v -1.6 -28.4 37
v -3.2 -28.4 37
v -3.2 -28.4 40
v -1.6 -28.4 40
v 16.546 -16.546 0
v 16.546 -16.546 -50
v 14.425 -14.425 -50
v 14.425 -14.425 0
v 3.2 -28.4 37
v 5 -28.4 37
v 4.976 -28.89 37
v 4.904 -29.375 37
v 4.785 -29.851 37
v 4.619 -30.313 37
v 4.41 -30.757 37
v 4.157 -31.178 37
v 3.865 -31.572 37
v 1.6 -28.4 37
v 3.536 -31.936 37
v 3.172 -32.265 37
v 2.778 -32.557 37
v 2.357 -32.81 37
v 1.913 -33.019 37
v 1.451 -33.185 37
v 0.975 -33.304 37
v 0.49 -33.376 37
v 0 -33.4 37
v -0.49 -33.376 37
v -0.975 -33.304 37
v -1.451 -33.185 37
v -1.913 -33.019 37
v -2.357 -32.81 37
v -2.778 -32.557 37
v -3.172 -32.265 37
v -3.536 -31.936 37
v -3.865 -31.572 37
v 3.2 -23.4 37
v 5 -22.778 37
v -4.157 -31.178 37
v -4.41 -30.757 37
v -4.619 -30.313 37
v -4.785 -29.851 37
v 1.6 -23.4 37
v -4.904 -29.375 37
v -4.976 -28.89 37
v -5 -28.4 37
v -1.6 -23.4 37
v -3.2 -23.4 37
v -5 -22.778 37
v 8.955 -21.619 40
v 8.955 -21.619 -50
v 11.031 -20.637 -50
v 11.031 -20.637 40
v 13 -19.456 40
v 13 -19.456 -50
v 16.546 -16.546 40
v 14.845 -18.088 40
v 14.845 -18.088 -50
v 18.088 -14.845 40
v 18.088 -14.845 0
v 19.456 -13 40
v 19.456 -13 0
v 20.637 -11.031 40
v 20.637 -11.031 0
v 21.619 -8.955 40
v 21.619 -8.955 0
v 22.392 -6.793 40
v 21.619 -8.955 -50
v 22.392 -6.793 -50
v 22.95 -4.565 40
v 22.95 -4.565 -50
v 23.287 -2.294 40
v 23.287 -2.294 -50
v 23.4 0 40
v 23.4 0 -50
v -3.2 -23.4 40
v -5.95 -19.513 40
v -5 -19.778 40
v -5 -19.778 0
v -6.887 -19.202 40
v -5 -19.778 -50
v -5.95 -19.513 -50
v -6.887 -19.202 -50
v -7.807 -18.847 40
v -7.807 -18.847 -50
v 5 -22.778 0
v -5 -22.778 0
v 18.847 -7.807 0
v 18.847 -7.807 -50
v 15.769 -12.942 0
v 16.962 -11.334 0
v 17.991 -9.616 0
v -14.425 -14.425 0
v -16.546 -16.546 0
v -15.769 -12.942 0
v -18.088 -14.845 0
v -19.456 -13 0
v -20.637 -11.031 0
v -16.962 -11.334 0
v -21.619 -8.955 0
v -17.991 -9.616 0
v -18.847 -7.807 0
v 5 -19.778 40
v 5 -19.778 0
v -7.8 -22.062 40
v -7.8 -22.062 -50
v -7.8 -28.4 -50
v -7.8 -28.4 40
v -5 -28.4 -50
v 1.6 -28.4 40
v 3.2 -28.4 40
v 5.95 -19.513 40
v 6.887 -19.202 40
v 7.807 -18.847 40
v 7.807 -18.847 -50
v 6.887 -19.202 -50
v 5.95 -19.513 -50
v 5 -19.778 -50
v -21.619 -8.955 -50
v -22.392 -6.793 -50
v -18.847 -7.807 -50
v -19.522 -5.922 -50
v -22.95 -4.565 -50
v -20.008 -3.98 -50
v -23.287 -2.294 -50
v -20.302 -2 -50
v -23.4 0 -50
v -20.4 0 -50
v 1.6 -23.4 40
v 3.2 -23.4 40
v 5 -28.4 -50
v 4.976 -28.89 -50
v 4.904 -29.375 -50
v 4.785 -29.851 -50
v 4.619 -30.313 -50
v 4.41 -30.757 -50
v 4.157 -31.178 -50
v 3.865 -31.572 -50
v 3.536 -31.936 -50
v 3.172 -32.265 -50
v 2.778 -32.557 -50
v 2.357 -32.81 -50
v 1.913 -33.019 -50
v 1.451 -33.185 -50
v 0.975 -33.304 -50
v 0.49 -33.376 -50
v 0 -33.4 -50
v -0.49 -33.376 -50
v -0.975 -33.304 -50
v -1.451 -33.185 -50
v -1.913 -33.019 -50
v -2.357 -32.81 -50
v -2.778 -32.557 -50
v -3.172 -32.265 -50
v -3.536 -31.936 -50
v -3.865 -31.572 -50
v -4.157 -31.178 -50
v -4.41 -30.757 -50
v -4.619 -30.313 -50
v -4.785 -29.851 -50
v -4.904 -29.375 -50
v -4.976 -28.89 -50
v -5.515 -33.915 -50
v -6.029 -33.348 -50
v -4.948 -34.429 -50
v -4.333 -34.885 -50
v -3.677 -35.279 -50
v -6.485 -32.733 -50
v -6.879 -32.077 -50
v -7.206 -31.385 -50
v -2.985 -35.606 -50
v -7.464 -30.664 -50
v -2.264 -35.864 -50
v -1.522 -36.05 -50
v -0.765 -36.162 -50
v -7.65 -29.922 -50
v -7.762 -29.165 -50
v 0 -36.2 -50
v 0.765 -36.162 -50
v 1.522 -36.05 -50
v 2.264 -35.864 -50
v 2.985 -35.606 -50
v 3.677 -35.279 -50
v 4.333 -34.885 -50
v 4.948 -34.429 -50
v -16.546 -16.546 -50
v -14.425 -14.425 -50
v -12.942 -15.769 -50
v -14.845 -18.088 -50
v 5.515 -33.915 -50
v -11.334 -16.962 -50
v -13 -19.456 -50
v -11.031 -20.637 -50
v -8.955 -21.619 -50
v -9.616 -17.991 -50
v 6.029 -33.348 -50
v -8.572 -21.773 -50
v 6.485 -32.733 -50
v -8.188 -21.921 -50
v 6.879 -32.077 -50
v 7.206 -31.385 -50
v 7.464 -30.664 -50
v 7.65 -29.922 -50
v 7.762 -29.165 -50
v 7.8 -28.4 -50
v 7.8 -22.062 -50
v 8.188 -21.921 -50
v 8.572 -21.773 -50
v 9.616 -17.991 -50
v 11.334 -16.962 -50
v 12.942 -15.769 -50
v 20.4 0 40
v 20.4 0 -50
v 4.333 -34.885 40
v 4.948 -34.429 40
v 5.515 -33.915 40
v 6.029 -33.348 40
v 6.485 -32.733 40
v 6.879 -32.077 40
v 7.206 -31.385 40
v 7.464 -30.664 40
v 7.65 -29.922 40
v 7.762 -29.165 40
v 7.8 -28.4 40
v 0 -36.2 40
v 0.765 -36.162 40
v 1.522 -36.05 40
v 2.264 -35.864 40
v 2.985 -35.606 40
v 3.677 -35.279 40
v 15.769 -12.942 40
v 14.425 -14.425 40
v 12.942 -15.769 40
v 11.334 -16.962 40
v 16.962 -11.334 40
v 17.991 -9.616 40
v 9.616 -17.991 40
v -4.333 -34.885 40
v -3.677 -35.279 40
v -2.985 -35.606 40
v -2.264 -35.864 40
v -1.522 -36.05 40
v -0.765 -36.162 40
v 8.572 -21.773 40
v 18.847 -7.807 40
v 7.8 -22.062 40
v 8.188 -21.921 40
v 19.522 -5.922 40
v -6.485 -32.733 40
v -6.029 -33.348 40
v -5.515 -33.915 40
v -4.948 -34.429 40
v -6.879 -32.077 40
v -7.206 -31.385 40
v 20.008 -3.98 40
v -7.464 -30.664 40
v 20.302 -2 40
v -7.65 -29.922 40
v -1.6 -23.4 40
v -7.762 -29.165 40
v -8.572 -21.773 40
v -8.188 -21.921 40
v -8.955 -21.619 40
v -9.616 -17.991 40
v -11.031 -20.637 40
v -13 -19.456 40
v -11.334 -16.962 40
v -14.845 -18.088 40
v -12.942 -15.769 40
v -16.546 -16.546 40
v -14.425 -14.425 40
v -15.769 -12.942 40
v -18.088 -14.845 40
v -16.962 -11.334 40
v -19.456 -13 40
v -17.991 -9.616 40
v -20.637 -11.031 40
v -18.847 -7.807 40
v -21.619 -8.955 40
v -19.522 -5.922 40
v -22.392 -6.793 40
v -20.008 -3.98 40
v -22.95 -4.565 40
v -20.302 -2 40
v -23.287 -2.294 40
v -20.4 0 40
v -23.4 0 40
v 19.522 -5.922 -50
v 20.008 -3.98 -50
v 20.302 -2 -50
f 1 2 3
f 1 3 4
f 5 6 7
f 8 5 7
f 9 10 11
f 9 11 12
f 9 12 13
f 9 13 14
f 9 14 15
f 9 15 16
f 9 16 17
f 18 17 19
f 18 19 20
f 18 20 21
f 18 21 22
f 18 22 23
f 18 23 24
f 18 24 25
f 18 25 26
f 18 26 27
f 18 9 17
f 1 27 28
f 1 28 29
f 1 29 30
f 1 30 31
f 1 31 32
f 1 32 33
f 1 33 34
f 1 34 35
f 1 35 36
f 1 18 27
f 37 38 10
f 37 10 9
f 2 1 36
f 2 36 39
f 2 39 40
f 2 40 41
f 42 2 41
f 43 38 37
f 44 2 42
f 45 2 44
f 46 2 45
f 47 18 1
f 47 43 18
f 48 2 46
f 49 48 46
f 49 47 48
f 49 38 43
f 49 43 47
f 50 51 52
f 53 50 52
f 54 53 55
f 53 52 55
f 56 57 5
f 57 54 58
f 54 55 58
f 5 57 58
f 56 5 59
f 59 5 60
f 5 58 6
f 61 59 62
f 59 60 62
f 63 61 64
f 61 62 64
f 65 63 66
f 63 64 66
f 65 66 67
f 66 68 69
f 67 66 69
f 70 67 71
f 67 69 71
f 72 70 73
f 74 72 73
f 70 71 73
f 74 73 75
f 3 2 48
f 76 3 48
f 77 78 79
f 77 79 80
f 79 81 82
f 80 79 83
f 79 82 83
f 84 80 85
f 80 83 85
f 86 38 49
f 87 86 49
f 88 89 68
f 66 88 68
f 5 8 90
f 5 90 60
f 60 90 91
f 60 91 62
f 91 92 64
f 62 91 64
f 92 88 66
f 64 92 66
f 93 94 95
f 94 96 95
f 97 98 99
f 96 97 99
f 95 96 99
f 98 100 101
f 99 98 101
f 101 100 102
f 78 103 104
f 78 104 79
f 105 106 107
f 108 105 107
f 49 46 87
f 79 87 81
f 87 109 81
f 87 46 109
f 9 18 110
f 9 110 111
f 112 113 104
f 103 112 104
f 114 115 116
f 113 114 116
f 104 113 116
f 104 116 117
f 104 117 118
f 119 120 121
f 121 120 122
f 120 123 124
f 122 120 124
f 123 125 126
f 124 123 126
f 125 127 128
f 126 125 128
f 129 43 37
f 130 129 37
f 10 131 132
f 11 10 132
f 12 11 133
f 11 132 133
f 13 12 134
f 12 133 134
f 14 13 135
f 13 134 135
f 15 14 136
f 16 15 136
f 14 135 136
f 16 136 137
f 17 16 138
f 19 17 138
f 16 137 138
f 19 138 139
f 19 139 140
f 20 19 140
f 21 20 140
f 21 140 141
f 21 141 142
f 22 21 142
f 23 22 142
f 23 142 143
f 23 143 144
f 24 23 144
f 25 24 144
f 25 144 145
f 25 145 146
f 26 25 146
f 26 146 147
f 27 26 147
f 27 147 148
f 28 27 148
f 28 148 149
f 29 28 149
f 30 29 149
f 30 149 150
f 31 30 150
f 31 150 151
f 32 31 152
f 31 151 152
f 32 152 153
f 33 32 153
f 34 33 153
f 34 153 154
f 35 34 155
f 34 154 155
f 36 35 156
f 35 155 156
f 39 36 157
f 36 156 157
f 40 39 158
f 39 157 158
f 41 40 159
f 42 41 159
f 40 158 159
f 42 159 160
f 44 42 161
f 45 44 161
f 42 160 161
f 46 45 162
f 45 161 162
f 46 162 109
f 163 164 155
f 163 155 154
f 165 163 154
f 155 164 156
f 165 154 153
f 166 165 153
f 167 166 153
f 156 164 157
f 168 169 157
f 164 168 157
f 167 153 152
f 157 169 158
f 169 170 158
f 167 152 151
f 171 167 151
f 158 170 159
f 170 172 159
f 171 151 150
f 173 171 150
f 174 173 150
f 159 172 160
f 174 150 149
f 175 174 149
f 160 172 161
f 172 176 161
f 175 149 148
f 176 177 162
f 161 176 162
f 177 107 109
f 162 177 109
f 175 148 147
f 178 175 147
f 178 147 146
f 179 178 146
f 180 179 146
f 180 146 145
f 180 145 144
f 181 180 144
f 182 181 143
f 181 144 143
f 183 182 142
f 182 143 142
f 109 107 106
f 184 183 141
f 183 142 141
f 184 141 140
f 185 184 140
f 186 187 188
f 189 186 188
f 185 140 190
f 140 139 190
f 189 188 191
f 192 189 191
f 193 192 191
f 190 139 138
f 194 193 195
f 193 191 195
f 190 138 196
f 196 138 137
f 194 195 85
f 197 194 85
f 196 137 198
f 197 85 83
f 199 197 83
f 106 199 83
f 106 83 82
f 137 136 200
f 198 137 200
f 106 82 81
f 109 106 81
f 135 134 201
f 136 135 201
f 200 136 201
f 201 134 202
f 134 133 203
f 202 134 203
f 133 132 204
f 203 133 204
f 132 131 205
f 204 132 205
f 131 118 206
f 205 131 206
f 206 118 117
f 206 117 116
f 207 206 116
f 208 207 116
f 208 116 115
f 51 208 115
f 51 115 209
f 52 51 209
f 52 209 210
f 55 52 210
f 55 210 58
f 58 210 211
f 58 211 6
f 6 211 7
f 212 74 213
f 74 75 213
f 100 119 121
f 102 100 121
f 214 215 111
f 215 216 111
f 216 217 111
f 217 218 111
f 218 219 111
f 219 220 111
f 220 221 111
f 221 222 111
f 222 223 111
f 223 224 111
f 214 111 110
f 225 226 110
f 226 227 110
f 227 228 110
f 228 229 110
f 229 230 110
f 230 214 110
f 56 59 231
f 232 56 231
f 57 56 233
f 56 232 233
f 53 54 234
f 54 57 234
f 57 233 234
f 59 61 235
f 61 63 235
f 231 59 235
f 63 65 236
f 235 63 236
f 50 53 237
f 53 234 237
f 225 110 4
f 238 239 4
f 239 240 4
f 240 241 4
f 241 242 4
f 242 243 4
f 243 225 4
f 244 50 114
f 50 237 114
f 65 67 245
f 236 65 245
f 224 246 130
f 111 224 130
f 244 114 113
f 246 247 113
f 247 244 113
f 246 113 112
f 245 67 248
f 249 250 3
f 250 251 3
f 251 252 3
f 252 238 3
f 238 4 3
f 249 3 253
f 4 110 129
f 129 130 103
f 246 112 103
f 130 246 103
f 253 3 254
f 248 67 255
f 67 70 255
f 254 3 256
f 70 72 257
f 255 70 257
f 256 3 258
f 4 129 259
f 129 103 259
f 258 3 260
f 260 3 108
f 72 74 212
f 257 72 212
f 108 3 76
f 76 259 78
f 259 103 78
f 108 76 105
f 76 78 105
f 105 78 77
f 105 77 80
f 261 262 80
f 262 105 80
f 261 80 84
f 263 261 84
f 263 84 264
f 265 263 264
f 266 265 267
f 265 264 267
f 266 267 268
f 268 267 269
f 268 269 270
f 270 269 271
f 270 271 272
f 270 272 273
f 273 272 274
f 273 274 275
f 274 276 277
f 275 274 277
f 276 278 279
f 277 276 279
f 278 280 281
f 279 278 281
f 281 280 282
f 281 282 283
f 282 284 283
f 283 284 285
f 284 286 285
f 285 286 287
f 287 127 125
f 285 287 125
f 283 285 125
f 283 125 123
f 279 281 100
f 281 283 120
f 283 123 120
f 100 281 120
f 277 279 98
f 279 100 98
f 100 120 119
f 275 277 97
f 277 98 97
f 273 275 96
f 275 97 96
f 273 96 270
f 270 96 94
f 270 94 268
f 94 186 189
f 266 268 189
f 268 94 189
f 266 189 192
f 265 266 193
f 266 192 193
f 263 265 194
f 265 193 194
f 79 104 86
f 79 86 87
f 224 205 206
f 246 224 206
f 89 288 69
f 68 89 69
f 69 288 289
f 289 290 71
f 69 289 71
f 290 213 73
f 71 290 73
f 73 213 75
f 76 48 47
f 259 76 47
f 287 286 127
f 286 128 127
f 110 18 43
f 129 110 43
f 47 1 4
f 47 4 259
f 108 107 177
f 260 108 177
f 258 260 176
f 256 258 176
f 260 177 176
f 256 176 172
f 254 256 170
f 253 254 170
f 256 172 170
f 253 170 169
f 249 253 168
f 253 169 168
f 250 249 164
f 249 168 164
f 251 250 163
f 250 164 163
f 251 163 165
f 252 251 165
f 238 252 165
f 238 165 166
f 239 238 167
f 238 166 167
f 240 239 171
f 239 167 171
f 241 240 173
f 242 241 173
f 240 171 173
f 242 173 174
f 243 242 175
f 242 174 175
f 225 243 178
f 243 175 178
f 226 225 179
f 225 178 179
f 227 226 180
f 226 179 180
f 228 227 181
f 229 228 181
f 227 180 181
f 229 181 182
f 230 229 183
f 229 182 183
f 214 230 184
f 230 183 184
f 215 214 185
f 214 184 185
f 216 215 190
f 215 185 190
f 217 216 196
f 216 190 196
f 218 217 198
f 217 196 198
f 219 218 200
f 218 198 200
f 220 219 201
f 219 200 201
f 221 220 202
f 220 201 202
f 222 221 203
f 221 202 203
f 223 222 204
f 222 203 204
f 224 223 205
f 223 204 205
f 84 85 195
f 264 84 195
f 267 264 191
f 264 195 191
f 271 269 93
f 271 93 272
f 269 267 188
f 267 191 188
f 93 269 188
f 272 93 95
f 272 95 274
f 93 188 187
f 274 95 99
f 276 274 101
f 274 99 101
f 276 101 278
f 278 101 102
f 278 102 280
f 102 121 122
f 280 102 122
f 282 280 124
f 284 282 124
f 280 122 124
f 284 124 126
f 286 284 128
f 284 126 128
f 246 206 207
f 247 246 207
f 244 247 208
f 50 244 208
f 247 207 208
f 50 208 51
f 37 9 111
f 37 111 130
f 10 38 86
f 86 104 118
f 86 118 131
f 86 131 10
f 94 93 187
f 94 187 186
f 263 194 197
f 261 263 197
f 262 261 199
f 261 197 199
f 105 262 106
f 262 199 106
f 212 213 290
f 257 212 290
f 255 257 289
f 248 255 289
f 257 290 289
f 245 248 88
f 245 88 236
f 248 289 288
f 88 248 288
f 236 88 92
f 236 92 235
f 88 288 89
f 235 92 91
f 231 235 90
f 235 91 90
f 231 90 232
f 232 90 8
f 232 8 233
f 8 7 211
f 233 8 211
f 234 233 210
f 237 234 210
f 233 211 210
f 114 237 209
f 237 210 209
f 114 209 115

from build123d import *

# Parameters (mm, degrees)
BOSS_EXTRUDE3_DEPTH = 40
BOSS_EXTRUDE7_START = -50
BOSS_EXTRUDE7_DEPTH = 50
BOSS_EXTRUDE8_START = -3
SKETCH3_W           = 1.6
SKETCH3_H           = 5
BOSS_EXTRUDE8_DEPTH = 3
SKETCH5_W           = 10
SKETCH5_H           = 3
BOSS_EXTRUDE9_DEPTH = 37


with BuildPart() as part:
    # Sketch1 → Boss-Extrude3 (new body)
    with BuildSketch(Plane.XY):
        with BuildLine():
            Line((23.4, 0), (20.4, 0))
            ThreePointArc((20.4, 0), (16.095962227, -12.533156027), (5, -19.777765293))
            Line((5, -19.777765293), (5, -28.4))
            ThreePointArc((5, -28.4), (0, -33.4), (-5, -28.4))
            Line((-5, -28.4), (-5, -19.777765293))
            ThreePointArc((-5, -19.777765293), (-16.095962227, -12.533156027), (-20.4, 0))
            Line((-20.4, 0), (-23.4, 0))
            ThreePointArc((-23.4, 0), (-19.106019994, -13.509996299), (-7.8, -22.061731573))
            Line((-7.8, -22.061731573), (-7.8, -28.4))
            ThreePointArc((-7.8, -28.4), (0, -36.2), (7.8, -28.4))
            Line((7.8, -28.4), (7.8, -22.061731573))
            ThreePointArc((7.8, -22.061731573), (19.106019994, -13.509996299), (23.4, 0))
        make_face()
    extrude(amount=BOSS_EXTRUDE3_DEPTH)

    # Sketch1<12> → Boss-Extrude7 (add)
    with BuildSketch(Plane.XY.offset(BOSS_EXTRUDE7_START)):
        with BuildLine():
            Line((23.4, 0), (20.4, 0))
            ThreePointArc((20.4, 0), (20.00801972, -3.979842569), (18.847142463, -7.80674202))
            Line((18.847142463, -7.80674202), (21.618781061, -8.954792317))
            ThreePointArc((21.618781061, -8.954792317), (22.950375561, -4.565113535), (23.4, 0))
        make_face()
        with BuildLine():
            ThreePointArc((-18.847142463, -7.80674202), (-20.00801972, -3.979842569), (-20.4, 0))
            Line((-20.4, 0), (-23.4, 0))
            ThreePointArc((-23.4, 0), (-22.950375561, -4.565113535), (-21.618781061, -8.954792317))
            Line((-21.618781061, -8.954792317), (-18.847142463, -7.80674202))
        make_face()
        with BuildLine():
            Line((16.54629868, -16.54629868), (14.424978336, -14.424978336))
            ThreePointArc((14.424978336, -14.424978336), (10.07449889, -17.738784403), (5, -19.777765293))
            Line((5, -19.777765293), (5, -28.4))
            ThreePointArc((5, -28.4), (0, -33.4), (-5, -28.4))
            Line((-5, -28.4), (-5, -19.777765293))
            ThreePointArc((-5, -19.777765293), (-10.07449889, -17.738784403), (-14.424978336, -14.424978336))
            Line((-14.424978336, -14.424978336), (-16.54629868, -16.54629868))
            ThreePointArc((-16.54629868, -16.54629868), (-12.481609065, -19.793166375), (-7.8, -22.061731573))
            Line((-7.8, -22.061731573), (-7.8, -28.4))
            ThreePointArc((-7.8, -28.4), (0, -36.2), (7.8, -28.4))
            Line((7.8, -28.4), (7.8, -22.061731573))
            ThreePointArc((7.8, -22.061731573), (12.481609065, -19.793166375), (16.54629868, -16.54629868))
        make_face()
    extrude(amount=BOSS_EXTRUDE7_DEPTH)

    # Sketch3 → Boss-Extrude8 (add)
    with BuildSketch(Plane.XY.offset(40).offset(BOSS_EXTRUDE8_START)):
        with BuildLine():
            Line((5, -19.777765293), (-5, -19.777765293))
            Line((-5, -19.777765293), (-5, -28.4))
            ThreePointArc((-5, -28.4), (0, -33.4), (5, -28.4))
            Line((5, -28.4), (5, -19.777765293))
        make_face()
        with Locations((-2.4, -25.9)):
            Rectangle(SKETCH3_W, SKETCH3_H, mode=Mode.SUBTRACT)
        with Locations((2.4, -25.9)):
            Rectangle(SKETCH3_W, SKETCH3_H, mode=Mode.SUBTRACT)
    extrude(amount=BOSS_EXTRUDE8_DEPTH)

    # Sketch5 → Boss-Extrude9 (add)
    with BuildSketch(Plane(origin=(0, 0, 37), x_dir=(-1, 0, 0), z_dir=(0, 0, -1))):
        with Locations((0, -21.277765293)):
            Rectangle(SKETCH5_W, SKETCH5_H)
    extrude(amount=BOSS_EXTRUDE9_DEPTH)


solid = part.part
